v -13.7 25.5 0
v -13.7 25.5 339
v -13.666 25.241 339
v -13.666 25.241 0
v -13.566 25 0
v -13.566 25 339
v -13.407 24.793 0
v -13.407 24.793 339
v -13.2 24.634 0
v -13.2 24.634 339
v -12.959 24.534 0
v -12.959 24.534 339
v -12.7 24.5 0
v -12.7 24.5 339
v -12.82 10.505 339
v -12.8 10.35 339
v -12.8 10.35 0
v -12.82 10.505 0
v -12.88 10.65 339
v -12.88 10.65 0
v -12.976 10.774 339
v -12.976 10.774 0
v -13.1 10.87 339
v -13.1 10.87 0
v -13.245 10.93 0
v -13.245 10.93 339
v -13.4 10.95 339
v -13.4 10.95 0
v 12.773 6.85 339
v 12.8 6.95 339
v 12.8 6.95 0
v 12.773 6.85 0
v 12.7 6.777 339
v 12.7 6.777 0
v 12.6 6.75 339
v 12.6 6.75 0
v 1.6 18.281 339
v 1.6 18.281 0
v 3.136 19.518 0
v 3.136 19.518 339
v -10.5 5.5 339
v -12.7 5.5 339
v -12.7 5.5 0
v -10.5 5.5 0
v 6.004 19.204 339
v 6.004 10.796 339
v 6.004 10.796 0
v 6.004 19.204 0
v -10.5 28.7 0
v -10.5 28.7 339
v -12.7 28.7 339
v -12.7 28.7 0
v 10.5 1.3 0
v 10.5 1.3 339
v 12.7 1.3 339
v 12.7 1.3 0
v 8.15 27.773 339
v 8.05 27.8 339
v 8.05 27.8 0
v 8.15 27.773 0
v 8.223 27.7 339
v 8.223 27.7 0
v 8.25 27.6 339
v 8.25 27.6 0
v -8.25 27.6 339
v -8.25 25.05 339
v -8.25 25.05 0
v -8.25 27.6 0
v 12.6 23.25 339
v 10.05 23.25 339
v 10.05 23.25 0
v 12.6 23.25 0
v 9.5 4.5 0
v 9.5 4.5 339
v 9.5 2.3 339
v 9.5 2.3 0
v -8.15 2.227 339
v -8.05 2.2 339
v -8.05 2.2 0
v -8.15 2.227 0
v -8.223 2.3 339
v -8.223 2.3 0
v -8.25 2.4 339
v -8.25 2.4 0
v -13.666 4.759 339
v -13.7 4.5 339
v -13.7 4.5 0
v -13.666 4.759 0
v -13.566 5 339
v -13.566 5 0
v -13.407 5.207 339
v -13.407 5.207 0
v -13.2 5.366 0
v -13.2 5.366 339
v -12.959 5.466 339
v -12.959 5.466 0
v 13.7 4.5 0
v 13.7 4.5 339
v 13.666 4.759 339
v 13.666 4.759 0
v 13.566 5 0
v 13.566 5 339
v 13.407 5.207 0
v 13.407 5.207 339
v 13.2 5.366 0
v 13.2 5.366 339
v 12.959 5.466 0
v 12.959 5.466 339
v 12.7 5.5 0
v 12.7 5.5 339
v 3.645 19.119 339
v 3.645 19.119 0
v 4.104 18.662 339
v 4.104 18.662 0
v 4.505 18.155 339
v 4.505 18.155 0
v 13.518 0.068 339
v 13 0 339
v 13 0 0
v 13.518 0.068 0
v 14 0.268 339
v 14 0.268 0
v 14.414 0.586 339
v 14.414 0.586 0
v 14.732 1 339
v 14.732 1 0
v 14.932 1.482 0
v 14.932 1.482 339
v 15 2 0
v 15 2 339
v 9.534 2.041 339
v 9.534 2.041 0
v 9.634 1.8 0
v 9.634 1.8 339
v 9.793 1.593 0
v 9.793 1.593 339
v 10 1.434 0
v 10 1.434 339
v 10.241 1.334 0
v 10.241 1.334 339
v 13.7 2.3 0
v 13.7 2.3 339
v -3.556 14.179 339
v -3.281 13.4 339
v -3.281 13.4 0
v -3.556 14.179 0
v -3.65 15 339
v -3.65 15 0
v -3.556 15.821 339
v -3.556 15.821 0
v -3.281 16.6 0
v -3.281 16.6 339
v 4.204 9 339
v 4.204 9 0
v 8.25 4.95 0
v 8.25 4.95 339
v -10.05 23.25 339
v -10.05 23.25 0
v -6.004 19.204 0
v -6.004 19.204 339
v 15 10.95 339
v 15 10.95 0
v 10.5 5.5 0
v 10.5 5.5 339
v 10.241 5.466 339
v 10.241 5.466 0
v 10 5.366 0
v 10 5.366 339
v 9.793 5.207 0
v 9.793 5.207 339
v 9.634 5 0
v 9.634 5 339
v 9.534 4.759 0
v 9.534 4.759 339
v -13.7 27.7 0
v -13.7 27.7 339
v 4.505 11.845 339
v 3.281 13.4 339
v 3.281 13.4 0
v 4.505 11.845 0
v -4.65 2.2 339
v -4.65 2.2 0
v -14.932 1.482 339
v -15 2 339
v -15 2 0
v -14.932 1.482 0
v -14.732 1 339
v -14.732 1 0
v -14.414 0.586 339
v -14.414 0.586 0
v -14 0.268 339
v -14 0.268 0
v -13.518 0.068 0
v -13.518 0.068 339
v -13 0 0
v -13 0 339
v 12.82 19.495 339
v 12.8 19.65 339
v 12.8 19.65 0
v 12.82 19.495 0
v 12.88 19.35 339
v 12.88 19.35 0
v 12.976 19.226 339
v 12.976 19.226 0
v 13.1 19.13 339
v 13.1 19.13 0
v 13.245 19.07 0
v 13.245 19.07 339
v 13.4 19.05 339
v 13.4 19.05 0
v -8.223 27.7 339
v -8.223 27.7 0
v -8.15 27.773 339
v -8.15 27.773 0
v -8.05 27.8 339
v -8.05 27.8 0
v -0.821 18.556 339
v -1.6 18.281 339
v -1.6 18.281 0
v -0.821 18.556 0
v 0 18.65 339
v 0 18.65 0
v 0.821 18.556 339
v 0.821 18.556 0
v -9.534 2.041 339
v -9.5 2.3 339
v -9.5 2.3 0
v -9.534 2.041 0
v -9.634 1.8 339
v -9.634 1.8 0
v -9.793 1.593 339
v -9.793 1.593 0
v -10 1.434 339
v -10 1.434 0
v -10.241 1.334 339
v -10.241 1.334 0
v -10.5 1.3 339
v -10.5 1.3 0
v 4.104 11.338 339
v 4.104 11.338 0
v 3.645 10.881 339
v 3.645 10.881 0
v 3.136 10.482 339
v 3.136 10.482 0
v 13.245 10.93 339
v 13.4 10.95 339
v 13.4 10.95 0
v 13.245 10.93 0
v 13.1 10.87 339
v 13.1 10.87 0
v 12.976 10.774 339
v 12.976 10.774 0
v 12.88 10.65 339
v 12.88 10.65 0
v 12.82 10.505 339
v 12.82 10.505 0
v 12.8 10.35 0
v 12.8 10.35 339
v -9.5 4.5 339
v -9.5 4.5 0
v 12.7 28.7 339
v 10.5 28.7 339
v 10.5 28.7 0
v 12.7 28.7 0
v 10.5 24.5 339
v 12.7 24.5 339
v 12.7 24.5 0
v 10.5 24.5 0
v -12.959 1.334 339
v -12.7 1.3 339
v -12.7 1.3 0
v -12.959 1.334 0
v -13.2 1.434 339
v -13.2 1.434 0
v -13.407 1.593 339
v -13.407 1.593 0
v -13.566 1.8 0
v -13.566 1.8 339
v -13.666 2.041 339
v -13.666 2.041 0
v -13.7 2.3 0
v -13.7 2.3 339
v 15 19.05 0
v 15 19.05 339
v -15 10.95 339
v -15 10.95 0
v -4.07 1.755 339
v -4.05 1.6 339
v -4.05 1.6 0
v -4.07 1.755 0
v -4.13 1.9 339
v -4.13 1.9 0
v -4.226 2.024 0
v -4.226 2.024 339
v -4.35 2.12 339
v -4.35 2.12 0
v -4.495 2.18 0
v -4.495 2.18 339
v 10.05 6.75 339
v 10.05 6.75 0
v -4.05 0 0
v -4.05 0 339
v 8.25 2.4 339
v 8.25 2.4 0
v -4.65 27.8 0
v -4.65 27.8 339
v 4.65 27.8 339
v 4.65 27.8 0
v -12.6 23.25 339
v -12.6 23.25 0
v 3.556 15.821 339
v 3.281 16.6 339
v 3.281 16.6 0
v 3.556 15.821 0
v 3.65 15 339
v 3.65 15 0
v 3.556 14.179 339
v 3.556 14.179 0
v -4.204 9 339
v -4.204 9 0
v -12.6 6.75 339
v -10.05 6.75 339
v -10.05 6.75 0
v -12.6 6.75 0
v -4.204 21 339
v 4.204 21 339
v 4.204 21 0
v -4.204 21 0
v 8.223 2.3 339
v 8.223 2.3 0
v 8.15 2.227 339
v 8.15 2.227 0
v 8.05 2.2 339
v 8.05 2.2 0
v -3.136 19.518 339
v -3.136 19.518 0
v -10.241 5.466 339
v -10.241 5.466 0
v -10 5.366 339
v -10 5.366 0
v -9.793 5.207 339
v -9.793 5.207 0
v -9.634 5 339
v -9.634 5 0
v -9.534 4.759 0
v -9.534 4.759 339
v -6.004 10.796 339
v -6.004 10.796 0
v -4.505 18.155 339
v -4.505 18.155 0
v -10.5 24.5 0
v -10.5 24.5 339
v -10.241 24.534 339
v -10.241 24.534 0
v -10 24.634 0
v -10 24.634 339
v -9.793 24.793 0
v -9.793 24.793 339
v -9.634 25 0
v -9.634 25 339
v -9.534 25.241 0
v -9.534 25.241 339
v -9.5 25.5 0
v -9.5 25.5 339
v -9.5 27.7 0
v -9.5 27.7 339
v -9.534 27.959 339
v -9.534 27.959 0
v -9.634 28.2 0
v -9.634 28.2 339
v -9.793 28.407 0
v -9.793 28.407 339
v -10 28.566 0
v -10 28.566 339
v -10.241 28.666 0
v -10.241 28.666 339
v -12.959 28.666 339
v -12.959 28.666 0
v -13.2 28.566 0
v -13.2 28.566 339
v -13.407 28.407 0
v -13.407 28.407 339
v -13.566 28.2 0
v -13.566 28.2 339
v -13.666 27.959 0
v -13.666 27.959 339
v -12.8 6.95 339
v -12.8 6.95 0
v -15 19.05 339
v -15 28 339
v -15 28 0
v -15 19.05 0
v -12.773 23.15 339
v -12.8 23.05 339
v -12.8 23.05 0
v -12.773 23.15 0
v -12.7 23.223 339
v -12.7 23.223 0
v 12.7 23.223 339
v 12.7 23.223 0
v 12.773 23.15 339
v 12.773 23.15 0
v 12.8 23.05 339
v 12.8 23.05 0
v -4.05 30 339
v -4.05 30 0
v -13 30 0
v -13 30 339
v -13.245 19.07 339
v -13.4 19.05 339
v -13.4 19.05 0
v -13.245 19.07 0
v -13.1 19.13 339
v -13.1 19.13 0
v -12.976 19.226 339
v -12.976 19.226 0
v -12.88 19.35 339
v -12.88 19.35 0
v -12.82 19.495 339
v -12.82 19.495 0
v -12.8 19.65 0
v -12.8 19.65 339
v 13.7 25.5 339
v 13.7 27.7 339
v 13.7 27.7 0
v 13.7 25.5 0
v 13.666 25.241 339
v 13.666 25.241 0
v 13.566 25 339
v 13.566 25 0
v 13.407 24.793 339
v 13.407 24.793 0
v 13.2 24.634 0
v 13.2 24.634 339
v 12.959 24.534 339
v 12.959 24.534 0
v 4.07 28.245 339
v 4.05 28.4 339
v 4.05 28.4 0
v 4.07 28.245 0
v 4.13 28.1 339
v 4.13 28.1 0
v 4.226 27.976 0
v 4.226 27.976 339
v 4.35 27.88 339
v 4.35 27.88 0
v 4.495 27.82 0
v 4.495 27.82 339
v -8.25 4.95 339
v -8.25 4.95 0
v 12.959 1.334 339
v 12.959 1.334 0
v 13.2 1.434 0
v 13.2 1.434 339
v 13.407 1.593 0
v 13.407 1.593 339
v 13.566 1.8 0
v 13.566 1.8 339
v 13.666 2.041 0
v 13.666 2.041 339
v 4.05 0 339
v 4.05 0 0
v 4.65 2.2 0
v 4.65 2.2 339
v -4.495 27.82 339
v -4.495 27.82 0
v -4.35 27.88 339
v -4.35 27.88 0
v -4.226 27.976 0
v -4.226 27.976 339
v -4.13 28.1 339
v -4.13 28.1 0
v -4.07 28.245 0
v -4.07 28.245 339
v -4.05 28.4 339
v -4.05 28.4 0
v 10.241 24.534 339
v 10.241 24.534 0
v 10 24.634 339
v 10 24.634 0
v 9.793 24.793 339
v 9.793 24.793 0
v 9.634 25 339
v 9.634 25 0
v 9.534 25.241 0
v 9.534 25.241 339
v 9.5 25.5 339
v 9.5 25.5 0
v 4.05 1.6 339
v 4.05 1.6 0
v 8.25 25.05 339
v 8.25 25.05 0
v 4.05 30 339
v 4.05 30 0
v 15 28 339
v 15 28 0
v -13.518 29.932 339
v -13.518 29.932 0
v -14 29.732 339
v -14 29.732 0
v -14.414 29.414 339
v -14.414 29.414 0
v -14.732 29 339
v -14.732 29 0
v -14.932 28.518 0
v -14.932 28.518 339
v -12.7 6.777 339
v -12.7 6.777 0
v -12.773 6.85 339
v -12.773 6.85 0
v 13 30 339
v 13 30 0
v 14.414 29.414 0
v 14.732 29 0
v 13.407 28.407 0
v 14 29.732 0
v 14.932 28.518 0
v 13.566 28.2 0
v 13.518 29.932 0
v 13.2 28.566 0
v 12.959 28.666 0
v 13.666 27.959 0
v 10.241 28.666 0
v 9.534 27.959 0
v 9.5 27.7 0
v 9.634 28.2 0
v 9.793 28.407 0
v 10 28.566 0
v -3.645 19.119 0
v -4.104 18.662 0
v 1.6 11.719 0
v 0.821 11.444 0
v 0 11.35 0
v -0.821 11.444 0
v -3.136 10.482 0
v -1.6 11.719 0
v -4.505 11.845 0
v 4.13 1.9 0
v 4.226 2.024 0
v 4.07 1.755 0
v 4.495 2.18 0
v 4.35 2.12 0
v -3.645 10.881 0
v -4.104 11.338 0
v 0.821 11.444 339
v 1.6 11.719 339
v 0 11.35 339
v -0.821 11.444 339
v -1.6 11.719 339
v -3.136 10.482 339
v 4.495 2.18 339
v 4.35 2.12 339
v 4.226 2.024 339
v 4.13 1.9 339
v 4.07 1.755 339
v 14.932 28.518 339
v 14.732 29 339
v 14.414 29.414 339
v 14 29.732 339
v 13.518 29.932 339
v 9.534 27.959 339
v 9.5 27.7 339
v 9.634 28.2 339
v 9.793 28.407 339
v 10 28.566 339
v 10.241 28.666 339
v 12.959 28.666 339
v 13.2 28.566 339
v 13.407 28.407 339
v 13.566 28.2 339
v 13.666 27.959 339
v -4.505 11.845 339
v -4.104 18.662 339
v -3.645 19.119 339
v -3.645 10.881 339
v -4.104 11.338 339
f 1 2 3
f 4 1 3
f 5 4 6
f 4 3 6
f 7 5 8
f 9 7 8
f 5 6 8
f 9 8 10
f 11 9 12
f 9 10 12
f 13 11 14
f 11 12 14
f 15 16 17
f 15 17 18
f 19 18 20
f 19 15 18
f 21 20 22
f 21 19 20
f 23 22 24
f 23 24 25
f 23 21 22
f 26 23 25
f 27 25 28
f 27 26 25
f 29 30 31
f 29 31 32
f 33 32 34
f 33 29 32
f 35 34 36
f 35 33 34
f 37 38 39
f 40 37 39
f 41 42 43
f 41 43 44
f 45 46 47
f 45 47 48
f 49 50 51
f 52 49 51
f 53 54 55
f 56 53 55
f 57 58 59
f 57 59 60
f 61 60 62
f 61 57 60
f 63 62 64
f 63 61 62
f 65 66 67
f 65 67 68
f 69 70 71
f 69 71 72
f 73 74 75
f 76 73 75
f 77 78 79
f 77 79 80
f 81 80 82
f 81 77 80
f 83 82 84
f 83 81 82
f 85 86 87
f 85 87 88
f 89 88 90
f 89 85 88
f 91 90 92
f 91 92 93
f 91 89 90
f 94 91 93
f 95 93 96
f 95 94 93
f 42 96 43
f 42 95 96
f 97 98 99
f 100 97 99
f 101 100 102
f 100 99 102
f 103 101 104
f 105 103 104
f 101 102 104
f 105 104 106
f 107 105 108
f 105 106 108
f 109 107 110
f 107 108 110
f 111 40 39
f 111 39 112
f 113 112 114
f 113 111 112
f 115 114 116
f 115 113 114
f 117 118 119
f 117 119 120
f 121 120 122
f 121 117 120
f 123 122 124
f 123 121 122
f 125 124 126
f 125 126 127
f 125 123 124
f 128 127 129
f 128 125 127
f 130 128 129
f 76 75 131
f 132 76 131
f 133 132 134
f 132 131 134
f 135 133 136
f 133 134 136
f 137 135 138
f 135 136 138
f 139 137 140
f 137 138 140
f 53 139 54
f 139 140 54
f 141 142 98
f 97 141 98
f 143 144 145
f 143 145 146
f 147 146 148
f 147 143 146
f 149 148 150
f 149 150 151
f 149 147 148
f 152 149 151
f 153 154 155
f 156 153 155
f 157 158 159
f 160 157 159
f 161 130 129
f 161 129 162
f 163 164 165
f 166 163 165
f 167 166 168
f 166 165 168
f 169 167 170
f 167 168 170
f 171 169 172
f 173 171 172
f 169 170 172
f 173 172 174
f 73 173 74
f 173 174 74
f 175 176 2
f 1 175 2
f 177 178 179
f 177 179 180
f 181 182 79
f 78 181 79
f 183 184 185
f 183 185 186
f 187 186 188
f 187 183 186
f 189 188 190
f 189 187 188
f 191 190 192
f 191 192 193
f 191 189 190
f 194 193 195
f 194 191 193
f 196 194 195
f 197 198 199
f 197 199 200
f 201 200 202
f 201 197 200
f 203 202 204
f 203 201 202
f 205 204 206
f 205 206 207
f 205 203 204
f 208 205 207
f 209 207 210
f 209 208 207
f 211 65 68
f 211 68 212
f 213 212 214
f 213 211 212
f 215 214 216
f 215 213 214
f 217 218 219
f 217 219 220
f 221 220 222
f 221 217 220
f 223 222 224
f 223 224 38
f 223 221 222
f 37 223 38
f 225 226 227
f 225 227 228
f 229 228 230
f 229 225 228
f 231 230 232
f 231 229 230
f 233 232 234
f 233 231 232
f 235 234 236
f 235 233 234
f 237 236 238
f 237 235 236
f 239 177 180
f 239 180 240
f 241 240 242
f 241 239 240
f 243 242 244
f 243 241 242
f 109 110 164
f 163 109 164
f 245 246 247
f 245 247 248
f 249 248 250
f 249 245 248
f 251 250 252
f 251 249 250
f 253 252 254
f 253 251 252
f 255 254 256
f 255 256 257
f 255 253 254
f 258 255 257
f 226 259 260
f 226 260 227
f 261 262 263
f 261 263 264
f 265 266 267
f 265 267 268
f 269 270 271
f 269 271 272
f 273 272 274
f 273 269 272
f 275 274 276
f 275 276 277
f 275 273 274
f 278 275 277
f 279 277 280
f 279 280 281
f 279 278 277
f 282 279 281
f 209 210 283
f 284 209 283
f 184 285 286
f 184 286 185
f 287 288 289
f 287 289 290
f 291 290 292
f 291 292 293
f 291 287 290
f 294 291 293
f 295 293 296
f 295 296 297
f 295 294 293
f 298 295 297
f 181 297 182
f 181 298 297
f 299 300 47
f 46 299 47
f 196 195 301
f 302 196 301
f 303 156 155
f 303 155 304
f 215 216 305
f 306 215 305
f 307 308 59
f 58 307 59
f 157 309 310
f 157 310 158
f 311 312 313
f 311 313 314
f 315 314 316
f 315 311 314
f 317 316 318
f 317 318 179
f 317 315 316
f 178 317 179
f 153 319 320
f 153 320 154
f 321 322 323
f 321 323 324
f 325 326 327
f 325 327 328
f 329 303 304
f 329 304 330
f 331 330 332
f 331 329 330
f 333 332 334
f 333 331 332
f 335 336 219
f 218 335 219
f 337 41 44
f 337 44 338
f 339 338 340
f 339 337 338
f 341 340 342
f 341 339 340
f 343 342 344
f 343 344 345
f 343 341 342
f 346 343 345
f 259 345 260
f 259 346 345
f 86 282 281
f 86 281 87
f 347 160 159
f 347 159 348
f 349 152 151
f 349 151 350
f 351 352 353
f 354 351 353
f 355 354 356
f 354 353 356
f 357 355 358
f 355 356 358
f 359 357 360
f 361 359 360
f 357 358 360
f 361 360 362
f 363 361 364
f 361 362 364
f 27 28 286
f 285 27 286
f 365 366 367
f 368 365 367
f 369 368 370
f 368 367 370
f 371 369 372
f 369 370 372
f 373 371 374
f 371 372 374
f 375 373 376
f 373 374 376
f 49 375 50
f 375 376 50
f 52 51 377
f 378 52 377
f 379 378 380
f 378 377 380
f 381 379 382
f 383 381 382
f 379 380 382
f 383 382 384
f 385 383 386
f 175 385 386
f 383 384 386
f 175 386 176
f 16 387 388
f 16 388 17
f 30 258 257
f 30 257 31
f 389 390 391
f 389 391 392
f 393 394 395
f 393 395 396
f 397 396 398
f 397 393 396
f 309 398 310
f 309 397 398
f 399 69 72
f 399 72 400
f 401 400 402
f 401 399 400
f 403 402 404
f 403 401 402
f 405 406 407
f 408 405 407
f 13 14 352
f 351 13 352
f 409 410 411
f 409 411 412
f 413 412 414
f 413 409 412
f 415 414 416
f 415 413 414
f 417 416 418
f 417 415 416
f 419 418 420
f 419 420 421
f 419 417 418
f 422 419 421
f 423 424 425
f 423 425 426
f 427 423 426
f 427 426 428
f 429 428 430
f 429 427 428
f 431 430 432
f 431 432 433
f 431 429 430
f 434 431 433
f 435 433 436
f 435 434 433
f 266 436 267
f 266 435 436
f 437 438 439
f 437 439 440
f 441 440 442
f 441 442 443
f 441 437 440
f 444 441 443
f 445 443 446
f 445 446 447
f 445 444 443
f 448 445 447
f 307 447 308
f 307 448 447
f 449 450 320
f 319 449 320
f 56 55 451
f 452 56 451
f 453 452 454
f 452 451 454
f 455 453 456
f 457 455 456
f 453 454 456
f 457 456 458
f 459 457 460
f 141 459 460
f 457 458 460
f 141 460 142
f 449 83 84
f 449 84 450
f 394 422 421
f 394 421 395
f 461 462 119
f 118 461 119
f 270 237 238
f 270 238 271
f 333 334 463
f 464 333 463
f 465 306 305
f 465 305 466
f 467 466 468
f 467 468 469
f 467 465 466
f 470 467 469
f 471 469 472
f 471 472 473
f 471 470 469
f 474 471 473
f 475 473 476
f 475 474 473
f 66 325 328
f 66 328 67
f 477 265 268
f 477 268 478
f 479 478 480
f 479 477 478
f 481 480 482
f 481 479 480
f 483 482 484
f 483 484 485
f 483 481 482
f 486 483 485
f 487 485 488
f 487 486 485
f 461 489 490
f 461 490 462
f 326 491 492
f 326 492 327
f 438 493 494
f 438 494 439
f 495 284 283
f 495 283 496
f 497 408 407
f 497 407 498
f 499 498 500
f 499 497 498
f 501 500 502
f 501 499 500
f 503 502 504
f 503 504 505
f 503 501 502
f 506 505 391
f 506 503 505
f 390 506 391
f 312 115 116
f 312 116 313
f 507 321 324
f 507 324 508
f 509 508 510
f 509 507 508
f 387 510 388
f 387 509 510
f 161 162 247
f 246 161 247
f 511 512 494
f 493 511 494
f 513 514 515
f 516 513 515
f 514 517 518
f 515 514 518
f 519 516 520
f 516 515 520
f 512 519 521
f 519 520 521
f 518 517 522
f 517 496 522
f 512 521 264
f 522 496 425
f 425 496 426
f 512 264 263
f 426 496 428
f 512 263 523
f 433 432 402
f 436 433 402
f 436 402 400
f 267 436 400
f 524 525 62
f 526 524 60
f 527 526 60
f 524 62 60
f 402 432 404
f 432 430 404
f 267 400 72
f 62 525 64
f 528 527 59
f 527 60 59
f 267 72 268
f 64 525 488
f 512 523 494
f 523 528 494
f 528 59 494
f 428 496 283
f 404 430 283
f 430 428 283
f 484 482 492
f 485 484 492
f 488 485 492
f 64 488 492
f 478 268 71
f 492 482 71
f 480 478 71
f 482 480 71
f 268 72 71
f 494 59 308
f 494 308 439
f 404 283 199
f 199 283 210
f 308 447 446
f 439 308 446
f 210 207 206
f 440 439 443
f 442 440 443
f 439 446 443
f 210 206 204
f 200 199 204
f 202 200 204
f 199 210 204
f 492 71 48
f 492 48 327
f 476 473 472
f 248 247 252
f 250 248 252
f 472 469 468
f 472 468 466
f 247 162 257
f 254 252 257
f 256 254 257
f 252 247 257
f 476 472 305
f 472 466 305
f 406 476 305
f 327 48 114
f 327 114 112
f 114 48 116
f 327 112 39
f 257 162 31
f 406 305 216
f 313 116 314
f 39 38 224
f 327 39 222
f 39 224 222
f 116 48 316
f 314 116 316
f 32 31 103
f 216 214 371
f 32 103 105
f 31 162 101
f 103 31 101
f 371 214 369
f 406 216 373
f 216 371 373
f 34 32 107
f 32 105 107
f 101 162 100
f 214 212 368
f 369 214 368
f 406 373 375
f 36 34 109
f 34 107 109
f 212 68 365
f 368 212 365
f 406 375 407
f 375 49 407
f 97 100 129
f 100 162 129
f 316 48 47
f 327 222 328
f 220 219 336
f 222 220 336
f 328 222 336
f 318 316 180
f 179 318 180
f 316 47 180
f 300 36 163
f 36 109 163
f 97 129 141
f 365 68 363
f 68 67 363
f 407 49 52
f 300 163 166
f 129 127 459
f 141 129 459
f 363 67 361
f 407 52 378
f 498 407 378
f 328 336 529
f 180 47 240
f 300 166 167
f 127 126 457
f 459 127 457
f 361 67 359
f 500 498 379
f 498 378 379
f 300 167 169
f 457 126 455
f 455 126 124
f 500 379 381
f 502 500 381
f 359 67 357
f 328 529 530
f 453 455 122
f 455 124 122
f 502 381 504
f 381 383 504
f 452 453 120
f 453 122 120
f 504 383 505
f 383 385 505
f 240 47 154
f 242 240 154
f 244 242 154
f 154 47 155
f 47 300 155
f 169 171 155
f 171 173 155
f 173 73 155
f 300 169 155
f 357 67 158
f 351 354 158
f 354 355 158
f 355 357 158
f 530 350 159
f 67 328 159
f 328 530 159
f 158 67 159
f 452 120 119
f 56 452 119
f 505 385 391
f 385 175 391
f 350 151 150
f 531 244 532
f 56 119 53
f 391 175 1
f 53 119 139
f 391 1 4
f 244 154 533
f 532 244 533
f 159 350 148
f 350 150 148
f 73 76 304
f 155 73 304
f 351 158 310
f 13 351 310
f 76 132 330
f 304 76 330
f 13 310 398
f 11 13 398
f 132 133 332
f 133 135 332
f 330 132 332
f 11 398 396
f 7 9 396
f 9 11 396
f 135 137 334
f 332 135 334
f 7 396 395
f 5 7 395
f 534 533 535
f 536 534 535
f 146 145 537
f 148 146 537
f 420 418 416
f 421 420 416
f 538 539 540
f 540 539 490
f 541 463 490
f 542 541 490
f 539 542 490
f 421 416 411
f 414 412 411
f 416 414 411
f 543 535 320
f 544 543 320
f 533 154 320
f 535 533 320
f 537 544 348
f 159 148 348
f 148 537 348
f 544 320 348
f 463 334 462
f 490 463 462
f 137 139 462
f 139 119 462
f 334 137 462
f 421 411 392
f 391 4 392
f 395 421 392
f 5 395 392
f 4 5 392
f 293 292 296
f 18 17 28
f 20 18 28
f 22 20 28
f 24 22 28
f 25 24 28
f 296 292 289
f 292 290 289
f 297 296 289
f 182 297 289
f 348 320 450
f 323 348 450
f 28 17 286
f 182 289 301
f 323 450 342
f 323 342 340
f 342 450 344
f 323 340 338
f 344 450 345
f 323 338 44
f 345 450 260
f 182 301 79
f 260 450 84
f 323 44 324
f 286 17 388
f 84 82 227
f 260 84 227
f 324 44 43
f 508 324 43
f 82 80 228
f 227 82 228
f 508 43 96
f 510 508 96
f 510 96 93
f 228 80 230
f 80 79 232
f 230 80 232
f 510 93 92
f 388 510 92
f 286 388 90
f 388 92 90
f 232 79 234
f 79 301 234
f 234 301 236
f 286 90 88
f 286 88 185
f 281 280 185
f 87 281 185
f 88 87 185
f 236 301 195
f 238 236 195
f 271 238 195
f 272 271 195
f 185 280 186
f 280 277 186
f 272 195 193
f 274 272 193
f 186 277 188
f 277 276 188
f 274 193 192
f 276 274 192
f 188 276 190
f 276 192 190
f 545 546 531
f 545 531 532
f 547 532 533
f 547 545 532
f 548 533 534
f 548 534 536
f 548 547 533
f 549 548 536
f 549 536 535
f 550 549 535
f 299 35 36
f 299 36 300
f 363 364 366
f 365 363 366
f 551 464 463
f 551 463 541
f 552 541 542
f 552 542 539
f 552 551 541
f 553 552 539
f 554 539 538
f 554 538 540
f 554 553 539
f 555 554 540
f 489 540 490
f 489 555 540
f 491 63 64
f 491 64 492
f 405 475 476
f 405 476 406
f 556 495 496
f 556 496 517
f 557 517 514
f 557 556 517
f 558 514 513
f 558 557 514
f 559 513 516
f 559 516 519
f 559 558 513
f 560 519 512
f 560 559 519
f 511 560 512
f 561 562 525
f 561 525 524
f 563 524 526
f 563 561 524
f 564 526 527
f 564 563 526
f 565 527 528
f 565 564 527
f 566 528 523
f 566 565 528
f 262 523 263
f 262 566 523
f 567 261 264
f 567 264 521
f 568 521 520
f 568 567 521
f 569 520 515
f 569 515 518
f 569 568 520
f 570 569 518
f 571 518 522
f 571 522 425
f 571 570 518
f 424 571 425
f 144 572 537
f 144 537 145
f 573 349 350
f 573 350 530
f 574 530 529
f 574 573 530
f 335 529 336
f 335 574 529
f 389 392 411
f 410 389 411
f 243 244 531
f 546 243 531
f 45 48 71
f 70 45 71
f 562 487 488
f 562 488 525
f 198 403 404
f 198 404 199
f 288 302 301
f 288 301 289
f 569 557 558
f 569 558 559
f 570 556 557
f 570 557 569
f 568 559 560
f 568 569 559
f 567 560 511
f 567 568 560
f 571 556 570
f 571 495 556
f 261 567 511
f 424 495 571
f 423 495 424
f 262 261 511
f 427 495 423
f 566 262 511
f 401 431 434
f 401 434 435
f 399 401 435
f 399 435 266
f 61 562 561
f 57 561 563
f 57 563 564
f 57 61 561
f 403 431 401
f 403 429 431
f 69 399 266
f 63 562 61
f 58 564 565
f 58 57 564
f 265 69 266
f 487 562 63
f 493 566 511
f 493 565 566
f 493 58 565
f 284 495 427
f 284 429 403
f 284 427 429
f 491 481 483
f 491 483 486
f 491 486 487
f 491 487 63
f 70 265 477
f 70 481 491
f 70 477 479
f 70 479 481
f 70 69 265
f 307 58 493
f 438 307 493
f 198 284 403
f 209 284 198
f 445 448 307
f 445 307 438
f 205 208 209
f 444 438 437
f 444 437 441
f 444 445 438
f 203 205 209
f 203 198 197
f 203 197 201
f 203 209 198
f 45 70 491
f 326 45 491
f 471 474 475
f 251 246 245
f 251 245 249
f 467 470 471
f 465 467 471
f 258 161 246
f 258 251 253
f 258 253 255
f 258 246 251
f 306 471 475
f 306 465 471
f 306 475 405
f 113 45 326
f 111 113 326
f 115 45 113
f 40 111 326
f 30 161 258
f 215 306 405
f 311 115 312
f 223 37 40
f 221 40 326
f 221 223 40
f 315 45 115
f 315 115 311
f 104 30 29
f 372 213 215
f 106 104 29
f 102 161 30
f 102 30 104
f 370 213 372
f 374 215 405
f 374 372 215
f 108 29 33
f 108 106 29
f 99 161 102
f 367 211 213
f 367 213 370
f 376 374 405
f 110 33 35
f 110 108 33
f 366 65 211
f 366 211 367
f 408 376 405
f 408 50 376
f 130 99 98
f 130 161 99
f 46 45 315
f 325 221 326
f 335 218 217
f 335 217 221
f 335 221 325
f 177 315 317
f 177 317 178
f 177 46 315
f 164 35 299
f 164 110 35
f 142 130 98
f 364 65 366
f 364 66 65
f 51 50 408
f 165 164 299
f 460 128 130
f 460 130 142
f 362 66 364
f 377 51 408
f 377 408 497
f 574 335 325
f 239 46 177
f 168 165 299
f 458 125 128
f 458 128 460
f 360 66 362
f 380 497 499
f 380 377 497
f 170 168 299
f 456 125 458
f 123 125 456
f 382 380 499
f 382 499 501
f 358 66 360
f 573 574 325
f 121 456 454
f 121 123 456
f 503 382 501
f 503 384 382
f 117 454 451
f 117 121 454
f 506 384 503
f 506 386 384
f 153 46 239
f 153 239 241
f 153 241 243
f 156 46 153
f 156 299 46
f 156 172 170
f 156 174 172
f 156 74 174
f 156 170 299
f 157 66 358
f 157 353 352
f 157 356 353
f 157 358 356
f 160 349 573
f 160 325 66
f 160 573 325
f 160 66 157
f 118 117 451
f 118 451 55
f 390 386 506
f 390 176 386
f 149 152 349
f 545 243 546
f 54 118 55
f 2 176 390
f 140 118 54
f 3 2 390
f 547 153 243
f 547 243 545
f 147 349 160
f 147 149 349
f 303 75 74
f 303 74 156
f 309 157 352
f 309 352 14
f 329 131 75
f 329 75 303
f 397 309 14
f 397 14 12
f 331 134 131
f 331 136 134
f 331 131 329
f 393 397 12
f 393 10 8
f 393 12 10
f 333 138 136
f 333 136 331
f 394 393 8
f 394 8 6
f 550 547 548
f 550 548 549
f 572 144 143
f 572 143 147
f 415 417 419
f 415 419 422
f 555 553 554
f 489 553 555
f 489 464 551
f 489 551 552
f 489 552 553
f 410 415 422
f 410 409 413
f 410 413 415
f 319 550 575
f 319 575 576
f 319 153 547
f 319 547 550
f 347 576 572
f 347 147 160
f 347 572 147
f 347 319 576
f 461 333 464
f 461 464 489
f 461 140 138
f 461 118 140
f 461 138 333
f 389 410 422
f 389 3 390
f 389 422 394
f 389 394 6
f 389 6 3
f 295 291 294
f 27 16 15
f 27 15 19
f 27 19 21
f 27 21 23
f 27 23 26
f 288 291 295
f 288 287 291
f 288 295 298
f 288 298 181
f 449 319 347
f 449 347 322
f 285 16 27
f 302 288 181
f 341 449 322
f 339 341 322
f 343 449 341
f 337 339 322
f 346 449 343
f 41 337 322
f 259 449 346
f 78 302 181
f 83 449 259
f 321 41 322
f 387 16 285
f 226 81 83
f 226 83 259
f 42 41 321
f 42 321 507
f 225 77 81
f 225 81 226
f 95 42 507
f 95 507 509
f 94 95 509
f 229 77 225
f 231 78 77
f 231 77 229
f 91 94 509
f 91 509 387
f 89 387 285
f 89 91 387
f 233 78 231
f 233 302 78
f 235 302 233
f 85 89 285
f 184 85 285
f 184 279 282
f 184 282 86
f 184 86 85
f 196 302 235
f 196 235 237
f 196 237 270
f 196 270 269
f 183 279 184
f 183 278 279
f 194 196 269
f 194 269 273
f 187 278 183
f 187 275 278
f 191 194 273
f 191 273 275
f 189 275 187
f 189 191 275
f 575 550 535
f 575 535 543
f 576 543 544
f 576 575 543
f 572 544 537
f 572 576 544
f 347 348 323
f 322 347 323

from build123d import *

# Parameters (mm, degrees)
BOSCH_REXROTH_DIMENSION_30_8MM_SLOTS_3_DEPTH = 339


with BuildPart() as part:
    # Sketch1 → Bosch rexroth dimension 30 (8mm slots) 30X30(7) (new body)
    with BuildSketch(Plane(origin=(0, 15, 339), x_dir=(1, 0, 0), z_dir=(0, 0, -1))):
        with BuildLine():
            Line((6.00446543, 4.204465866), (6.00446543, -4.204465866))
            Line((6.00446543, -4.204465866), (10.049999564, -8.25))
            Line((10.049999564, -8.25), (12.59999928, -8.25))
            ThreePointArc((12.59999928, -8.25), (12.741420837, -8.191421273), (12.799999564, -8.049999716))
            Line((12.799999564, -8.049999716), (12.799999564, -4.649999613))
            ThreePointArc((12.799999564, -4.649999613), (12.975735606, -4.225735278), (13.39999994, -4.049999237))
            Line((13.39999994, -4.049999237), (15, -4.049999237))
            Line((15, -4.049999237), (15, -13.000000346))
            ThreePointArc((15, -13.000000346), (14.414213664, -14.414213664), (13.000000346, -15))
            Line((13.000000346, -15), (4.05, -15))
            Line((4.05, -15), (4.05, -13.399999434))
            ThreePointArc((4.05, -13.399999434), (4.225735989, -12.975735226), (4.650000197, -12.799999237))
            Line((4.650000197, -12.799999237), (8.049999924, -12.799999237))
            ThreePointArc((8.049999924, -12.799999237), (8.191421565, -12.741420475), (8.250000327, -12.599998834))
            Line((8.250000327, -12.599998834), (8.250000327, -10.049999237))
            Line((8.250000327, -10.049999237), (4.204466193, -6))
            Line((4.204466193, -6), (-4.204466193, -6))
            Line((-4.204466193, -6), (-8.250000327, -10.049999237))
            Line((-8.250000327, -10.049999237), (-8.250000327, -12.599998834))
            ThreePointArc((-8.250000327, -12.599998834), (-8.191421565, -12.741420475), (-8.049999924, -12.799999237))
            Line((-8.049999924, -12.799999237), (-4.650000197, -12.799999237))
            ThreePointArc((-4.650000197, -12.799999237), (-4.225735989, -12.975735226), (-4.05, -13.399999434))
            Line((-4.05, -13.399999434), (-4.05, -15))
            Line((-4.05, -15), (-13.000000346, -15))
            ThreePointArc((-13.000000346, -15), (-14.414213664, -14.414213664), (-15, -13.000000346))
            Line((-15, -13.000000346), (-15, -4.049999237))
            Line((-15, -4.049999237), (-13.39999994, -4.049999237))
            ThreePointArc((-13.39999994, -4.049999237), (-12.975735606, -4.225735278), (-12.799999564, -4.649999613))
            Line((-12.799999564, -4.649999613), (-12.799999564, -8.049999716))
            ThreePointArc((-12.799999564, -8.049999716), (-12.741420837, -8.191421273), (-12.59999928, -8.25))
            Line((-12.59999928, -8.25), (-10.049999564, -8.25))
            Line((-10.049999564, -8.25), (-6.00446543, -4.204465866))
            Line((-6.00446543, -4.204465866), (-6.00446543, 4.204465866))
            Line((-6.00446543, 4.204465866), (-10.049999564, 8.25))
            Line((-10.049999564, 8.25), (-12.59999928, 8.25))
            ThreePointArc((-12.59999928, 8.25), (-12.741420837, 8.191421273), (-12.799999564, 8.049999716))
            Line((-12.799999564, 8.049999716), (-12.799999564, 4.649999613))
            ThreePointArc((-12.799999564, 4.649999613), (-12.975735606, 4.225735278), (-13.39999994, 4.049999237))
            Line((-13.39999994, 4.049999237), (-15, 4.049999237))
            Line((-15, 4.049999237), (-15, 13.000000346))
            ThreePointArc((-15, 13.000000346), (-14.414213664, 14.414213664), (-13.000000346, 15))
            Line((-13.000000346, 15), (-4.05, 15))
            Line((-4.05, 15), (-4.05, 13.399999434))
            ThreePointArc((-4.05, 13.399999434), (-4.225735989, 12.975735226), (-4.650000197, 12.799999237))
            Line((-4.650000197, 12.799999237), (-8.049999924, 12.799999237))
            ThreePointArc((-8.049999924, 12.799999237), (-8.191421565, 12.741420475), (-8.250000327, 12.599998834))
            Line((-8.250000327, 12.599998834), (-8.250000327, 10.049999237))
            Line((-8.250000327, 10.049999237), (-4.204466193, 6))
            Line((-4.204466193, 6), (4.204466193, 6))
            Line((4.204466193, 6), (8.250000327, 10.049999237))
            Line((8.250000327, 10.049999237), (8.250000327, 12.599998834))
            ThreePointArc((8.250000327, 12.599998834), (8.191421565, 12.741420475), (8.049999924, 12.799999237))
            Line((8.049999924, 12.799999237), (4.650000197, 12.799999237))
            ThreePointArc((4.650000197, 12.799999237), (4.225735989, 12.975735226), (4.05, 13.399999434))
            Line((4.05, 13.399999434), (4.05, 15))
            Line((4.05, 15), (13.000000346, 15))
            ThreePointArc((13.000000346, 15), (14.414213664, 14.414213664), (15, 13.000000346))
            Line((15, 13.000000346), (15, 4.049999237))
            Line((15, 4.049999237), (13.39999994, 4.049999237))
            ThreePointArc((13.39999994, 4.049999237), (12.975735606, 4.225735278), (12.799999564, 4.649999613))
            Line((12.799999564, 4.649999613), (12.799999564, 8.049999716))
            ThreePointArc((12.799999564, 8.049999716), (12.741420837, 8.191421273), (12.59999928, 8.25))
            Line((12.59999928, 8.25), (10.049999564, 8.25))
            Line((10.049999564, 8.25), (6.00446543, 4.204465866))
        make_face()
        with BuildLine():
            Line((13.70000109, 12.700000408), (13.70000109, 10.499999626))
            ThreePointArc((13.70000109, 10.499999626), (13.407107874, 9.792892851), (12.7000011, 9.499999635))
            Line((12.7000011, 9.499999635), (10.500000318, 9.499999635))
            ThreePointArc((10.500000318, 9.499999635), (9.792893543, 9.792892851), (9.500000327, 10.499999626))
            Line((9.500000327, 10.499999626), (9.500000327, 12.700000408))
            ThreePointArc((9.500000327, 12.700000408), (9.792893543, 13.407107182), (10.500000318, 13.700000398))
            Line((10.500000318, 13.700000398), (12.7000011, 13.700000398))
            ThreePointArc((12.7000011, 13.700000398), (13.407107874, 13.407107182), (13.70000109, 12.700000408))
        make_face(mode=Mode.SUBTRACT)
        with BuildLine():
            Line((3.135929412, 4.518400903), (1.600129524, 3.280561767))
            ThreePointArc((1.600129524, 3.280561767), (0, 3.65), (-1.600129524, 3.280561767))
            Line((-1.600129524, 3.280561767), (-3.135929412, 4.518400903))
            ThreePointArc((-3.135929412, 4.518400903), (-3.881002259, 3.897155561), (-4.505336892, 3.154669473))
            Line((-4.505336892, 3.154669473), (-3.280561732, 1.600129597))
            ThreePointArc((-3.280561732, 1.600129597), (-3.65, 0), (-3.280561732, -1.600129597))
            Line((-3.280561732, -1.600129597), (-4.505336892, -3.154669473))
            ThreePointArc((-4.505336892, -3.154669473), (-3.881002259, -3.897155561), (-3.135929412, -4.518400903))
            Line((-3.135929412, -4.518400903), (-1.600129524, -3.280561767))
            ThreePointArc((-1.600129524, -3.280561767), (0, -3.65), (1.600129524, -3.280561767))
            Line((1.600129524, -3.280561767), (3.135929412, -4.518400903))
            ThreePointArc((3.135929412, -4.518400903), (3.881002259, -3.897155561), (4.505336892, -3.154669473))
            Line((4.505336892, -3.154669473), (3.280561732, -1.600129597))
            ThreePointArc((3.280561732, -1.600129597), (3.65, 0), (3.280561732, 1.600129597))
            Line((3.280561732, 1.600129597), (4.505336892, 3.154669473))
            ThreePointArc((4.505336892, 3.154669473), (3.881002259, 3.897155561), (3.135929412, 4.518400903))
        make_face(mode=Mode.SUBTRACT)
        with BuildLine():
            Line((-13.70000109, -12.700000408), (-13.70000109, -10.499999626))
            ThreePointArc((-13.70000109, -10.499999626), (-13.407107874, -9.792892851), (-12.7000011, -9.499999635))
            Line((-12.7000011, -9.499999635), (-10.500000318, -9.499999635))
            ThreePointArc((-10.500000318, -9.499999635), (-9.792893543, -9.792892851), (-9.500000327, -10.499999626))
            Line((-9.500000327, -10.499999626), (-9.500000327, -12.700000408))
            ThreePointArc((-9.500000327, -12.700000408), (-9.792893543, -13.407107182), (-10.500000318, -13.700000398))
            Line((-10.500000318, -13.700000398), (-12.7000011, -13.700000398))
            ThreePointArc((-12.7000011, -13.700000398), (-13.407107874, -13.407107182), (-13.70000109, -12.700000408))
        make_face(mode=Mode.SUBTRACT)
        with BuildLine():
            Line((10.500000318, -13.700000398), (12.7000011, -13.700000398))
            ThreePointArc((12.7000011, -13.700000398), (13.407107874, -13.407107182), (13.70000109, -12.700000408))
            Line((13.70000109, -12.700000408), (13.70000109, -10.499999626))
            ThreePointArc((13.70000109, -10.499999626), (13.407107874, -9.792892851), (12.7000011, -9.499999635))
            Line((12.7000011, -9.499999635), (10.500000318, -9.499999635))
            ThreePointArc((10.500000318, -9.499999635), (9.792893543, -9.792892851), (9.500000327, -10.499999626))
            Line((9.500000327, -10.499999626), (9.500000327, -12.700000408))
            ThreePointArc((9.500000327, -12.700000408), (9.792893543, -13.407107182), (10.500000318, -13.700000398))
        make_face(mode=Mode.SUBTRACT)
        with BuildLine():
            Line((-10.500000318, 13.700000398), (-12.7000011, 13.700000398))
            ThreePointArc((-12.7000011, 13.700000398), (-13.407107874, 13.407107182), (-13.70000109, 12.700000408))
            Line((-13.70000109, 12.700000408), (-13.70000109, 10.499999626))
            ThreePointArc((-13.70000109, 10.499999626), (-13.407107874, 9.792892851), (-12.7000011, 9.499999635))
            Line((-12.7000011, 9.499999635), (-10.500000318, 9.499999635))
            ThreePointArc((-10.500000318, 9.499999635), (-9.792893543, 9.792892851), (-9.500000327, 10.499999626))
            Line((-9.500000327, 10.499999626), (-9.500000327, 12.700000408))
            ThreePointArc((-9.500000327, 12.700000408), (-9.792893543, 13.407107182), (-10.500000318, 13.700000398))
        make_face(mode=Mode.SUBTRACT)
    extrude(amount=BOSCH_REXROTH_DIMENSION_30_8MM_SLOTS_3_DEPTH)


solid = part.part
